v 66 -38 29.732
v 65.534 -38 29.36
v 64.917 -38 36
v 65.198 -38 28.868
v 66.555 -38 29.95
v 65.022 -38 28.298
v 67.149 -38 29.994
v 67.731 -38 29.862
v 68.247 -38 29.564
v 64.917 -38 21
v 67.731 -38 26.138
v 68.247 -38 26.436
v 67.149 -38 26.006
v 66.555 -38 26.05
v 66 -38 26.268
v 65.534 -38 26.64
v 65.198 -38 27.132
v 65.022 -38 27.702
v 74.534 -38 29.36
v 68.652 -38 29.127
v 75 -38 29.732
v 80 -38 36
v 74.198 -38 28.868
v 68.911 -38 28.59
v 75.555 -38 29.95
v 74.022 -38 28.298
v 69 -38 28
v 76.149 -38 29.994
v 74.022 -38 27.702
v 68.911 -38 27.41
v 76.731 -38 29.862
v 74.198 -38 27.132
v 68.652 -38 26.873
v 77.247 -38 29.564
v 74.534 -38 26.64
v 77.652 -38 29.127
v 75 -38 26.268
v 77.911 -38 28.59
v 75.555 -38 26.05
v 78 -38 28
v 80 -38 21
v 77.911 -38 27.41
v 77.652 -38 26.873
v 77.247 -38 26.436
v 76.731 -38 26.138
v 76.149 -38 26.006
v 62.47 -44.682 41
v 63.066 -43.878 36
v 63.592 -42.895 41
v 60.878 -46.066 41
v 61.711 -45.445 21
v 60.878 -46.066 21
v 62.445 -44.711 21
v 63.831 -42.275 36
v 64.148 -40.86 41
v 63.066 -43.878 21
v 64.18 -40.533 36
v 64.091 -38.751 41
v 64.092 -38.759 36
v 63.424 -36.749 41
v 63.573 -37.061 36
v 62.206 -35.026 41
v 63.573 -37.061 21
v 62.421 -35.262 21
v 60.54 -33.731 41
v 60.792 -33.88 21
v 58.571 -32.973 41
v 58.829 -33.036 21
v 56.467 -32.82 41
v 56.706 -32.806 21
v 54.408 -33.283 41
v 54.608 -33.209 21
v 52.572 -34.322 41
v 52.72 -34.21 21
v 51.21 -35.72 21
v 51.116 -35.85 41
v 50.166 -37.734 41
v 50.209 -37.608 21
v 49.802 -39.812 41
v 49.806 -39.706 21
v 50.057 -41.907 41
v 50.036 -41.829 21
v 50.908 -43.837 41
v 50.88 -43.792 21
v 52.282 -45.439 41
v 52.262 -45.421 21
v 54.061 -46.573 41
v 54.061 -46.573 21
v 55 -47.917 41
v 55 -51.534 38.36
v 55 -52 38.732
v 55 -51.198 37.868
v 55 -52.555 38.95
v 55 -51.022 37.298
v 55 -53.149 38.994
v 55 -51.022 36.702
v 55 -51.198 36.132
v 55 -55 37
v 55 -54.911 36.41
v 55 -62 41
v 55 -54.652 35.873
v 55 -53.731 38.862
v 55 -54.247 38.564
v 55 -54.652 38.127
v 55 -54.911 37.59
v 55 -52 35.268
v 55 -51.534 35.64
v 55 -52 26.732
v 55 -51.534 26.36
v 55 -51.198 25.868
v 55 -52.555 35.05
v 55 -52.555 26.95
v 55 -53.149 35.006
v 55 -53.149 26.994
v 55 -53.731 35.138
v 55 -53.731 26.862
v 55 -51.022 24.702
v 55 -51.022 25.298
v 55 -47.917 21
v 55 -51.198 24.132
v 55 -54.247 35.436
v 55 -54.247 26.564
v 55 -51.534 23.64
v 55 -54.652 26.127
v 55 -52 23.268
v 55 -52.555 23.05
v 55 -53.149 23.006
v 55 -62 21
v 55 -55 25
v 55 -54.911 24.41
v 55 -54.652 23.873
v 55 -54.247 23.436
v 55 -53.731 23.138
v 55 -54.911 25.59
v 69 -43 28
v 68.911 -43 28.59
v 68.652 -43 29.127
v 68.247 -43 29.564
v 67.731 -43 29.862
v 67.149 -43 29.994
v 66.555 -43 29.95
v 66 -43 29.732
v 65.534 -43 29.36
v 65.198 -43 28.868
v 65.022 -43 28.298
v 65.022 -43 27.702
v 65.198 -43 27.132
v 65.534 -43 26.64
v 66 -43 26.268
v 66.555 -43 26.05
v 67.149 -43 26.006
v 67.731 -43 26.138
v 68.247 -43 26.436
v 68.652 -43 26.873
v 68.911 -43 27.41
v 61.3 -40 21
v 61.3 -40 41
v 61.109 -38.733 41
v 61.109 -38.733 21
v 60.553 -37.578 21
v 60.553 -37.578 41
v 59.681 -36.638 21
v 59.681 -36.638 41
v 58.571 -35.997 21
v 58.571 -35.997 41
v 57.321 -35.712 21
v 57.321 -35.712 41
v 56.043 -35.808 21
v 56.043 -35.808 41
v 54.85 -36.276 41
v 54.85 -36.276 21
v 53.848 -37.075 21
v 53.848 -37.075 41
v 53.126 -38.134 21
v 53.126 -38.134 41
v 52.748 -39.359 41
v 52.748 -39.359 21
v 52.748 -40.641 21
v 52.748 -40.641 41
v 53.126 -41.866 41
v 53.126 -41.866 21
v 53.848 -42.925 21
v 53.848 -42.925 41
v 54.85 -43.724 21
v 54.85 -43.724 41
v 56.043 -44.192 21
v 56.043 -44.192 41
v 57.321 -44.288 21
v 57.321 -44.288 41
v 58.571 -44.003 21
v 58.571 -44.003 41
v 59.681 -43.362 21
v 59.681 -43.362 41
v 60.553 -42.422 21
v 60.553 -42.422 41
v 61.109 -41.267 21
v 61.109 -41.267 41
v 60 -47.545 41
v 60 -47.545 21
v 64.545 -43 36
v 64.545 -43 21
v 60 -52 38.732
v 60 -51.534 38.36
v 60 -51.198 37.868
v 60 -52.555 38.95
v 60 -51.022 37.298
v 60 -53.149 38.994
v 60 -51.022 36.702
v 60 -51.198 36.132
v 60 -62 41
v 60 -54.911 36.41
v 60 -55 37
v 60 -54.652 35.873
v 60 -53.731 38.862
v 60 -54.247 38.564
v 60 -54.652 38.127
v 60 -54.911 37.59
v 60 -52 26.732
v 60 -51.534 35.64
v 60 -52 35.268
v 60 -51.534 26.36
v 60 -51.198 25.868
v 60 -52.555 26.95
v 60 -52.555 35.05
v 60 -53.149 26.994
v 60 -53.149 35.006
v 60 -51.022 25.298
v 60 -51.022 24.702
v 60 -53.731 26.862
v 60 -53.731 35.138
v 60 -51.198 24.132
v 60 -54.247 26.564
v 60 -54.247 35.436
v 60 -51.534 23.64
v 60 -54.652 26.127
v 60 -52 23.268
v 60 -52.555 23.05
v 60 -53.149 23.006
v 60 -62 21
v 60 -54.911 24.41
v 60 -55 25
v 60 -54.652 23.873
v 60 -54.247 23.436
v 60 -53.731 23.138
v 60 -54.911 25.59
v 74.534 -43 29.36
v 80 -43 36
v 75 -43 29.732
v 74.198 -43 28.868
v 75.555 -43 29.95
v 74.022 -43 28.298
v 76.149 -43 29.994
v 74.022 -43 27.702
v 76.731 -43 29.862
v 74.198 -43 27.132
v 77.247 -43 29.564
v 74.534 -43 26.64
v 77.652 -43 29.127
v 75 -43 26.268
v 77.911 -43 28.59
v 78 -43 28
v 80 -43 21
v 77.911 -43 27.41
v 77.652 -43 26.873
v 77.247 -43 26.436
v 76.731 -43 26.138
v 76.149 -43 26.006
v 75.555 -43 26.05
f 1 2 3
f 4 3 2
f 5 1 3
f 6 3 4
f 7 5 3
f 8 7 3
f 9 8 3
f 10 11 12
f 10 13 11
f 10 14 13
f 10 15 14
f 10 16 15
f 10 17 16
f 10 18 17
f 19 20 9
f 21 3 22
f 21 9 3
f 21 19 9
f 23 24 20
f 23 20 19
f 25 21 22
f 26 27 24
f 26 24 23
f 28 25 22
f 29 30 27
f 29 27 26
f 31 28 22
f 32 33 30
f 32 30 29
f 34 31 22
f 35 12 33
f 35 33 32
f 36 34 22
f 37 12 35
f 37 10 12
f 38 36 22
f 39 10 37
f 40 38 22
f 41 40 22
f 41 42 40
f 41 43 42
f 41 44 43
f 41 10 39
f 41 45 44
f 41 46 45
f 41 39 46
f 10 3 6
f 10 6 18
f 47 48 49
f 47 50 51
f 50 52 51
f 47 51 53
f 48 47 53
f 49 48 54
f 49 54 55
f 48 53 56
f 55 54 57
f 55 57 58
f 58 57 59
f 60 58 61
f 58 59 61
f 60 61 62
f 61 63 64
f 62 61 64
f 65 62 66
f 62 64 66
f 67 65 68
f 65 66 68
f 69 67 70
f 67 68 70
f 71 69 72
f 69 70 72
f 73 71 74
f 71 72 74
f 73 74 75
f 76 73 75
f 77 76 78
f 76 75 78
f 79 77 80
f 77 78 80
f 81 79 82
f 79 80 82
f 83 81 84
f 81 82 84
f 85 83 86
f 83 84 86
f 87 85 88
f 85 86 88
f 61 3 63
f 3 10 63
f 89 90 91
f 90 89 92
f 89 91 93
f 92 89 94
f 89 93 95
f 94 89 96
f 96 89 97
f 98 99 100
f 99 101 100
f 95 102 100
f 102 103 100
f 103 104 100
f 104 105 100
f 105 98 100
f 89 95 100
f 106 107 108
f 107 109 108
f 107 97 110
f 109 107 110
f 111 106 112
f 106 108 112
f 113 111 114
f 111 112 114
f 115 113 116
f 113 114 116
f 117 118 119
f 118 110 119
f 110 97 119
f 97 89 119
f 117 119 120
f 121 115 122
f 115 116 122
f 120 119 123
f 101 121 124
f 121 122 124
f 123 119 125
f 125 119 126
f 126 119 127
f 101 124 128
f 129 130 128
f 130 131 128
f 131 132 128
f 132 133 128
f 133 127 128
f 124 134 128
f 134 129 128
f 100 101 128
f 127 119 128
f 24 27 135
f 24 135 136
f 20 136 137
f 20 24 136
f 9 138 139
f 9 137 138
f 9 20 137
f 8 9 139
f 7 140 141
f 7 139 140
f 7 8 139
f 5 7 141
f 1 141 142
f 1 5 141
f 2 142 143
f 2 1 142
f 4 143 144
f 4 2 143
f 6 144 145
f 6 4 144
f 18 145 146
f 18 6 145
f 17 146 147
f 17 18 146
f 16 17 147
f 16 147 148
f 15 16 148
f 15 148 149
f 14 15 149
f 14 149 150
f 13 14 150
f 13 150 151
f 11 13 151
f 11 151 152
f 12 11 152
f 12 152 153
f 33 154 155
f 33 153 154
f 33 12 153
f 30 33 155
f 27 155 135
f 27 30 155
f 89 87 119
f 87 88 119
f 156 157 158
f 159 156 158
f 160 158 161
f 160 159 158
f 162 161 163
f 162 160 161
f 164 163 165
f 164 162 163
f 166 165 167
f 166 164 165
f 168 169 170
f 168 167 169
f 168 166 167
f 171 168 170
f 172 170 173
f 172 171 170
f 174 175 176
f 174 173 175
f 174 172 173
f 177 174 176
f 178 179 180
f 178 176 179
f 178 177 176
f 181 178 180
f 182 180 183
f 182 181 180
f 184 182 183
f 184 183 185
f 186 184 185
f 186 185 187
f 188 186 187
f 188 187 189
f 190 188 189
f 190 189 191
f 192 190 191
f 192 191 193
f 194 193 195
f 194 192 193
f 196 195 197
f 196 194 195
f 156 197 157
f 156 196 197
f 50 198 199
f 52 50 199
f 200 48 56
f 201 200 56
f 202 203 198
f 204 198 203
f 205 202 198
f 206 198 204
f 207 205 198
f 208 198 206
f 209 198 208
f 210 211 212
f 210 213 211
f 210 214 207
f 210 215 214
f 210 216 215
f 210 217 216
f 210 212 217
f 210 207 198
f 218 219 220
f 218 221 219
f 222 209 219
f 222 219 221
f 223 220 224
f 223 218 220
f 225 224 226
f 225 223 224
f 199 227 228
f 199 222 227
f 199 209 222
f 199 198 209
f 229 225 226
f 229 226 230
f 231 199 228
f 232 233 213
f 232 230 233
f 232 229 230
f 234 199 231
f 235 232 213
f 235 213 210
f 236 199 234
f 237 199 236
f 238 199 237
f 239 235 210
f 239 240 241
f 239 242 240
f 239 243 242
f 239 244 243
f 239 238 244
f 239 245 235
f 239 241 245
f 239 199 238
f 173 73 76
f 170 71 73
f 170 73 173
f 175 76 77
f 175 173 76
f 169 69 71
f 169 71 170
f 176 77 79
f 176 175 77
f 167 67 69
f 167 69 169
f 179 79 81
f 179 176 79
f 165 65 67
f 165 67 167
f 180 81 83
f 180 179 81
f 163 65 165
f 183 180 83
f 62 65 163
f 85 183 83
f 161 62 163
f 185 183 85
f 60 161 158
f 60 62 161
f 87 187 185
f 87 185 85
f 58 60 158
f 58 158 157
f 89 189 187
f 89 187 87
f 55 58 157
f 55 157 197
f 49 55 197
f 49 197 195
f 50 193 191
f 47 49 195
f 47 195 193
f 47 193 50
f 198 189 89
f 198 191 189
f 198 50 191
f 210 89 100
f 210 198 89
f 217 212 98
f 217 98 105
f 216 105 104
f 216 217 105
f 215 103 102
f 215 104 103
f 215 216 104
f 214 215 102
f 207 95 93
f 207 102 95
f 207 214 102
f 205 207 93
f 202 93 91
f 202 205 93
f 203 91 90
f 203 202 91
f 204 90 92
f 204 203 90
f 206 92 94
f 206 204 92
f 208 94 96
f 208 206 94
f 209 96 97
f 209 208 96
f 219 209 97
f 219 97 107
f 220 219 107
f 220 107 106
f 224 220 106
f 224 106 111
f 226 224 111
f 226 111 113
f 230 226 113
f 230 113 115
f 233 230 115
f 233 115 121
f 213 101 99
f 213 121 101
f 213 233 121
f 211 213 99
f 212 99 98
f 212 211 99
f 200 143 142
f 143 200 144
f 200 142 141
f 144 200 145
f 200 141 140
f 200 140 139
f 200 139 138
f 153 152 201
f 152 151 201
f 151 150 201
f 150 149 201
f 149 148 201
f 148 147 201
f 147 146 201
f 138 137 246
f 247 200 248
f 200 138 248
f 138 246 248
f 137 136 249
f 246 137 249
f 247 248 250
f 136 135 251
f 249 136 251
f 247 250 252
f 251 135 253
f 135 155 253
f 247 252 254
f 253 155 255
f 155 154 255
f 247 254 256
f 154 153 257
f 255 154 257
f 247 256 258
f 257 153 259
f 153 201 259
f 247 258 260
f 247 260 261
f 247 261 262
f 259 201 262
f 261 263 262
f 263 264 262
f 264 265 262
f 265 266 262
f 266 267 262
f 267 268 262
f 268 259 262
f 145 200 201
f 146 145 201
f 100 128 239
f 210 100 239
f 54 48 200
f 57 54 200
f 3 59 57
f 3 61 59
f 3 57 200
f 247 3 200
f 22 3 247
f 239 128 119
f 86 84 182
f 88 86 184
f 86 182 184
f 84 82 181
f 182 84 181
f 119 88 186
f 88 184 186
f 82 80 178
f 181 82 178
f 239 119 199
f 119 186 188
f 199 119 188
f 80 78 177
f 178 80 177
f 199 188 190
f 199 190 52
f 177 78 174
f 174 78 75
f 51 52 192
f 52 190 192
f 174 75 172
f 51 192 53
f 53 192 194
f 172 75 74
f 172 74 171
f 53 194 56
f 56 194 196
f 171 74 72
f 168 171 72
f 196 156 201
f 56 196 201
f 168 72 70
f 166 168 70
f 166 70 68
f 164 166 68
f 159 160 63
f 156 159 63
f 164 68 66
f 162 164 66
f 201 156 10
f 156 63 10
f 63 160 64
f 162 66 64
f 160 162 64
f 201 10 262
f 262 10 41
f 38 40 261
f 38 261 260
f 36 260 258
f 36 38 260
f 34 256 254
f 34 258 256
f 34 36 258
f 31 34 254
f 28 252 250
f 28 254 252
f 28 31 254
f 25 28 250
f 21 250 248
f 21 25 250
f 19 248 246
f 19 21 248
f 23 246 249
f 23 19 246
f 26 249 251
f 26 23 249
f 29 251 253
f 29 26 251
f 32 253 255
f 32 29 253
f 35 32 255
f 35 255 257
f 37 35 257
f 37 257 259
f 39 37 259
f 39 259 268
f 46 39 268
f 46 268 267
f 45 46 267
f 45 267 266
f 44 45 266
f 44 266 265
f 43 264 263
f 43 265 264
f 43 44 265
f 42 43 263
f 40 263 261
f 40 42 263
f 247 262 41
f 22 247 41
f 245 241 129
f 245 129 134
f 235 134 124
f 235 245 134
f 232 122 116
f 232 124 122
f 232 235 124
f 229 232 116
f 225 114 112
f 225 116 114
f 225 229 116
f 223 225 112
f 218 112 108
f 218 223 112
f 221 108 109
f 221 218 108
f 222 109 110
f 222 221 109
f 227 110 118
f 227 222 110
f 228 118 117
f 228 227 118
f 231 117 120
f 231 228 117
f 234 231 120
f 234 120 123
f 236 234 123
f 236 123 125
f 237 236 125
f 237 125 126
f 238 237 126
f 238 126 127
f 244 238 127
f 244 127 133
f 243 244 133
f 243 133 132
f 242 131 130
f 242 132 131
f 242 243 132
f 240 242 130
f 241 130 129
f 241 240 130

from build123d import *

# Parameters (mm, degrees)
CYLINDER036_R          = 4.3
CYLINDER036_DEPTH      = 200
CYLINDER043_R          = 2
CYLINDER043_DEPTH      = 10
CYLINDER043_ROLL_ANGLE = 90
CYLINDER042_R          = 2
CYLINDER042_DEPTH      = 10
CYLINDER042_ROLL_ANGLE = 90
BOX010_W               = 24
BOX010_H               = 5
BOX010_DEPTH           = 15
CYLINDER044_R          = 2
CYLINDER044_DEPTH      = 10
CYLINDER045_R          = 2
CYLINDER045_DEPTH      = 10
BOX011_W               = 19
BOX011_H               = 5
BOX011_DEPTH           = 20
BOX011_PLACEMENT_ANGLE = -90
CYLINDER041_R          = 7.2
CYLINDER041_DEPTH      = 20
CHAMFER006_SIZE        = 1


with BuildPart() as cilindro033:
    # Cylinder036 → Cylinder036 (new body)
    with BuildSketch(Plane(origin=(57, -40, -29), x_dir=(1, 0, 0), z_dir=(0, 0, 1))):
        Circle(CYLINDER036_R)
    extrude(amount=CYLINDER036_DEPTH)


with BuildPart() as cilindro040:
    # Cylinder043 → Cylinder043 (new body)
    with BuildSketch(Plane.XY):
        Circle(CYLINDER043_R)
    extrude(amount=CYLINDER043_DEPTH)


with BuildPart() as cilindro040_1:
    # Cylinder043 roll: moved
    add(cilindro040.part.rotate(Axis((0, 0, 0), (1, 0, 0)), CYLINDER043_ROLL_ANGLE))


with BuildPart() as cilindro040_2:
    # Cylinder043 placement: moved
    add(cilindro040_1.part.moved(Location((76, -37, 30))))


with BuildPart() as fusion007:
    # Cylinder042 → Cylinder042 (new body)
    with BuildSketch(Plane.XY):
        Circle(CYLINDER042_R)
    extrude(amount=CYLINDER042_DEPTH)


with BuildPart() as fusion007_1:
    # Cylinder042 roll: moved
    add(fusion007.part.rotate(Axis((0, 0, 0), (1, 0, 0)), CYLINDER042_ROLL_ANGLE))


with BuildPart() as fusion007_2:
    # Cylinder042 placement: moved
    add(fusion007_1.part.moved(Location((67, -37, 30))))

    # Fusion007: union Cilindro040
    add(cilindro040_2.part)


with BuildPart() as cut032:
    # Box010 → Box010 (new body)
    with BuildSketch(Plane(origin=(56, -43, 23), x_dir=(1, 0, 0), z_dir=(0, 0, 1))):
        with Locations((12, 2.5)):
            Rectangle(BOX010_W, BOX010_H)
    extrude(amount=BOX010_DEPTH)

    # Cut032: cut Fusion007
    add(fusion007_2.part, mode=Mode.SUBTRACT)


with BuildPart() as cut032_1:
    # Cut032 placement: moved
    add(cut032.part.moved(Location((0, 0, -2))))


with BuildPart() as cilindro041:
    # Cylinder044 → Cylinder044 (new body)
    with BuildSketch(Plane(origin=(63, -53, 25), x_dir=(0, -1, 0), z_dir=(-1, 0, 0))):
        Circle(CYLINDER044_R)
    extrude(amount=CYLINDER044_DEPTH)


with BuildPart() as fusion008:
    # Cylinder045 → Cylinder045 (new body)
    with BuildSketch(Plane(origin=(63, -53, 37), x_dir=(0, -1, 0), z_dir=(-1, 0, 0))):
        Circle(CYLINDER045_R)
    extrude(amount=CYLINDER045_DEPTH)

    # Fusion008: union Cilindro041
    add(cilindro041.part)


with BuildPart() as cut033:
    # Box011 → Box011 (new body)
    with BuildSketch(Plane.XY):
        with Locations((9.5, 2.5)):
            Rectangle(BOX011_W, BOX011_H)
    extrude(amount=BOX011_DEPTH)


with BuildPart() as cut033_1:
    # Box011 placement: moved
    add(cut033.part.moved(Location((55, -43, 21))).rotate(Axis((55, -43, 21), (0, 0, 1)), BOX011_PLACEMENT_ANGLE))

    # Cut033: cut Fusion008
    add(fusion008.part, mode=Mode.SUBTRACT)


with BuildPart() as rodamiento_lineal:
    # Cylinder041 → Cylinder041 (new body)
    with BuildSketch(Plane(origin=(57, -40, 21), x_dir=(1, 0, 0), z_dir=(0, 0, 1))):
        Circle(CYLINDER041_R)
    extrude(amount=CYLINDER041_DEPTH)

    # Fusion009: union Cut032, Cut033
    add(cut032_1.part)
    add(cut033_1.part)

    # Chamfer006
    chamfer006_edges = [rodamiento_lineal.edges().sort_by_distance(p)[0] for p in [
        (63.916647, -38, 28.5),
        (63.545227, -43, 28.5),
        (55, -46.916647, 31),
        (60, -46.545227, 31),
    ]]
    chamfer(chamfer006_edges, length=CHAMFER006_SIZE)

    # Cut034: cut Cilindro033
    add(cilindro033.part, mode=Mode.SUBTRACT)


solid = rodamiento_lineal.part
